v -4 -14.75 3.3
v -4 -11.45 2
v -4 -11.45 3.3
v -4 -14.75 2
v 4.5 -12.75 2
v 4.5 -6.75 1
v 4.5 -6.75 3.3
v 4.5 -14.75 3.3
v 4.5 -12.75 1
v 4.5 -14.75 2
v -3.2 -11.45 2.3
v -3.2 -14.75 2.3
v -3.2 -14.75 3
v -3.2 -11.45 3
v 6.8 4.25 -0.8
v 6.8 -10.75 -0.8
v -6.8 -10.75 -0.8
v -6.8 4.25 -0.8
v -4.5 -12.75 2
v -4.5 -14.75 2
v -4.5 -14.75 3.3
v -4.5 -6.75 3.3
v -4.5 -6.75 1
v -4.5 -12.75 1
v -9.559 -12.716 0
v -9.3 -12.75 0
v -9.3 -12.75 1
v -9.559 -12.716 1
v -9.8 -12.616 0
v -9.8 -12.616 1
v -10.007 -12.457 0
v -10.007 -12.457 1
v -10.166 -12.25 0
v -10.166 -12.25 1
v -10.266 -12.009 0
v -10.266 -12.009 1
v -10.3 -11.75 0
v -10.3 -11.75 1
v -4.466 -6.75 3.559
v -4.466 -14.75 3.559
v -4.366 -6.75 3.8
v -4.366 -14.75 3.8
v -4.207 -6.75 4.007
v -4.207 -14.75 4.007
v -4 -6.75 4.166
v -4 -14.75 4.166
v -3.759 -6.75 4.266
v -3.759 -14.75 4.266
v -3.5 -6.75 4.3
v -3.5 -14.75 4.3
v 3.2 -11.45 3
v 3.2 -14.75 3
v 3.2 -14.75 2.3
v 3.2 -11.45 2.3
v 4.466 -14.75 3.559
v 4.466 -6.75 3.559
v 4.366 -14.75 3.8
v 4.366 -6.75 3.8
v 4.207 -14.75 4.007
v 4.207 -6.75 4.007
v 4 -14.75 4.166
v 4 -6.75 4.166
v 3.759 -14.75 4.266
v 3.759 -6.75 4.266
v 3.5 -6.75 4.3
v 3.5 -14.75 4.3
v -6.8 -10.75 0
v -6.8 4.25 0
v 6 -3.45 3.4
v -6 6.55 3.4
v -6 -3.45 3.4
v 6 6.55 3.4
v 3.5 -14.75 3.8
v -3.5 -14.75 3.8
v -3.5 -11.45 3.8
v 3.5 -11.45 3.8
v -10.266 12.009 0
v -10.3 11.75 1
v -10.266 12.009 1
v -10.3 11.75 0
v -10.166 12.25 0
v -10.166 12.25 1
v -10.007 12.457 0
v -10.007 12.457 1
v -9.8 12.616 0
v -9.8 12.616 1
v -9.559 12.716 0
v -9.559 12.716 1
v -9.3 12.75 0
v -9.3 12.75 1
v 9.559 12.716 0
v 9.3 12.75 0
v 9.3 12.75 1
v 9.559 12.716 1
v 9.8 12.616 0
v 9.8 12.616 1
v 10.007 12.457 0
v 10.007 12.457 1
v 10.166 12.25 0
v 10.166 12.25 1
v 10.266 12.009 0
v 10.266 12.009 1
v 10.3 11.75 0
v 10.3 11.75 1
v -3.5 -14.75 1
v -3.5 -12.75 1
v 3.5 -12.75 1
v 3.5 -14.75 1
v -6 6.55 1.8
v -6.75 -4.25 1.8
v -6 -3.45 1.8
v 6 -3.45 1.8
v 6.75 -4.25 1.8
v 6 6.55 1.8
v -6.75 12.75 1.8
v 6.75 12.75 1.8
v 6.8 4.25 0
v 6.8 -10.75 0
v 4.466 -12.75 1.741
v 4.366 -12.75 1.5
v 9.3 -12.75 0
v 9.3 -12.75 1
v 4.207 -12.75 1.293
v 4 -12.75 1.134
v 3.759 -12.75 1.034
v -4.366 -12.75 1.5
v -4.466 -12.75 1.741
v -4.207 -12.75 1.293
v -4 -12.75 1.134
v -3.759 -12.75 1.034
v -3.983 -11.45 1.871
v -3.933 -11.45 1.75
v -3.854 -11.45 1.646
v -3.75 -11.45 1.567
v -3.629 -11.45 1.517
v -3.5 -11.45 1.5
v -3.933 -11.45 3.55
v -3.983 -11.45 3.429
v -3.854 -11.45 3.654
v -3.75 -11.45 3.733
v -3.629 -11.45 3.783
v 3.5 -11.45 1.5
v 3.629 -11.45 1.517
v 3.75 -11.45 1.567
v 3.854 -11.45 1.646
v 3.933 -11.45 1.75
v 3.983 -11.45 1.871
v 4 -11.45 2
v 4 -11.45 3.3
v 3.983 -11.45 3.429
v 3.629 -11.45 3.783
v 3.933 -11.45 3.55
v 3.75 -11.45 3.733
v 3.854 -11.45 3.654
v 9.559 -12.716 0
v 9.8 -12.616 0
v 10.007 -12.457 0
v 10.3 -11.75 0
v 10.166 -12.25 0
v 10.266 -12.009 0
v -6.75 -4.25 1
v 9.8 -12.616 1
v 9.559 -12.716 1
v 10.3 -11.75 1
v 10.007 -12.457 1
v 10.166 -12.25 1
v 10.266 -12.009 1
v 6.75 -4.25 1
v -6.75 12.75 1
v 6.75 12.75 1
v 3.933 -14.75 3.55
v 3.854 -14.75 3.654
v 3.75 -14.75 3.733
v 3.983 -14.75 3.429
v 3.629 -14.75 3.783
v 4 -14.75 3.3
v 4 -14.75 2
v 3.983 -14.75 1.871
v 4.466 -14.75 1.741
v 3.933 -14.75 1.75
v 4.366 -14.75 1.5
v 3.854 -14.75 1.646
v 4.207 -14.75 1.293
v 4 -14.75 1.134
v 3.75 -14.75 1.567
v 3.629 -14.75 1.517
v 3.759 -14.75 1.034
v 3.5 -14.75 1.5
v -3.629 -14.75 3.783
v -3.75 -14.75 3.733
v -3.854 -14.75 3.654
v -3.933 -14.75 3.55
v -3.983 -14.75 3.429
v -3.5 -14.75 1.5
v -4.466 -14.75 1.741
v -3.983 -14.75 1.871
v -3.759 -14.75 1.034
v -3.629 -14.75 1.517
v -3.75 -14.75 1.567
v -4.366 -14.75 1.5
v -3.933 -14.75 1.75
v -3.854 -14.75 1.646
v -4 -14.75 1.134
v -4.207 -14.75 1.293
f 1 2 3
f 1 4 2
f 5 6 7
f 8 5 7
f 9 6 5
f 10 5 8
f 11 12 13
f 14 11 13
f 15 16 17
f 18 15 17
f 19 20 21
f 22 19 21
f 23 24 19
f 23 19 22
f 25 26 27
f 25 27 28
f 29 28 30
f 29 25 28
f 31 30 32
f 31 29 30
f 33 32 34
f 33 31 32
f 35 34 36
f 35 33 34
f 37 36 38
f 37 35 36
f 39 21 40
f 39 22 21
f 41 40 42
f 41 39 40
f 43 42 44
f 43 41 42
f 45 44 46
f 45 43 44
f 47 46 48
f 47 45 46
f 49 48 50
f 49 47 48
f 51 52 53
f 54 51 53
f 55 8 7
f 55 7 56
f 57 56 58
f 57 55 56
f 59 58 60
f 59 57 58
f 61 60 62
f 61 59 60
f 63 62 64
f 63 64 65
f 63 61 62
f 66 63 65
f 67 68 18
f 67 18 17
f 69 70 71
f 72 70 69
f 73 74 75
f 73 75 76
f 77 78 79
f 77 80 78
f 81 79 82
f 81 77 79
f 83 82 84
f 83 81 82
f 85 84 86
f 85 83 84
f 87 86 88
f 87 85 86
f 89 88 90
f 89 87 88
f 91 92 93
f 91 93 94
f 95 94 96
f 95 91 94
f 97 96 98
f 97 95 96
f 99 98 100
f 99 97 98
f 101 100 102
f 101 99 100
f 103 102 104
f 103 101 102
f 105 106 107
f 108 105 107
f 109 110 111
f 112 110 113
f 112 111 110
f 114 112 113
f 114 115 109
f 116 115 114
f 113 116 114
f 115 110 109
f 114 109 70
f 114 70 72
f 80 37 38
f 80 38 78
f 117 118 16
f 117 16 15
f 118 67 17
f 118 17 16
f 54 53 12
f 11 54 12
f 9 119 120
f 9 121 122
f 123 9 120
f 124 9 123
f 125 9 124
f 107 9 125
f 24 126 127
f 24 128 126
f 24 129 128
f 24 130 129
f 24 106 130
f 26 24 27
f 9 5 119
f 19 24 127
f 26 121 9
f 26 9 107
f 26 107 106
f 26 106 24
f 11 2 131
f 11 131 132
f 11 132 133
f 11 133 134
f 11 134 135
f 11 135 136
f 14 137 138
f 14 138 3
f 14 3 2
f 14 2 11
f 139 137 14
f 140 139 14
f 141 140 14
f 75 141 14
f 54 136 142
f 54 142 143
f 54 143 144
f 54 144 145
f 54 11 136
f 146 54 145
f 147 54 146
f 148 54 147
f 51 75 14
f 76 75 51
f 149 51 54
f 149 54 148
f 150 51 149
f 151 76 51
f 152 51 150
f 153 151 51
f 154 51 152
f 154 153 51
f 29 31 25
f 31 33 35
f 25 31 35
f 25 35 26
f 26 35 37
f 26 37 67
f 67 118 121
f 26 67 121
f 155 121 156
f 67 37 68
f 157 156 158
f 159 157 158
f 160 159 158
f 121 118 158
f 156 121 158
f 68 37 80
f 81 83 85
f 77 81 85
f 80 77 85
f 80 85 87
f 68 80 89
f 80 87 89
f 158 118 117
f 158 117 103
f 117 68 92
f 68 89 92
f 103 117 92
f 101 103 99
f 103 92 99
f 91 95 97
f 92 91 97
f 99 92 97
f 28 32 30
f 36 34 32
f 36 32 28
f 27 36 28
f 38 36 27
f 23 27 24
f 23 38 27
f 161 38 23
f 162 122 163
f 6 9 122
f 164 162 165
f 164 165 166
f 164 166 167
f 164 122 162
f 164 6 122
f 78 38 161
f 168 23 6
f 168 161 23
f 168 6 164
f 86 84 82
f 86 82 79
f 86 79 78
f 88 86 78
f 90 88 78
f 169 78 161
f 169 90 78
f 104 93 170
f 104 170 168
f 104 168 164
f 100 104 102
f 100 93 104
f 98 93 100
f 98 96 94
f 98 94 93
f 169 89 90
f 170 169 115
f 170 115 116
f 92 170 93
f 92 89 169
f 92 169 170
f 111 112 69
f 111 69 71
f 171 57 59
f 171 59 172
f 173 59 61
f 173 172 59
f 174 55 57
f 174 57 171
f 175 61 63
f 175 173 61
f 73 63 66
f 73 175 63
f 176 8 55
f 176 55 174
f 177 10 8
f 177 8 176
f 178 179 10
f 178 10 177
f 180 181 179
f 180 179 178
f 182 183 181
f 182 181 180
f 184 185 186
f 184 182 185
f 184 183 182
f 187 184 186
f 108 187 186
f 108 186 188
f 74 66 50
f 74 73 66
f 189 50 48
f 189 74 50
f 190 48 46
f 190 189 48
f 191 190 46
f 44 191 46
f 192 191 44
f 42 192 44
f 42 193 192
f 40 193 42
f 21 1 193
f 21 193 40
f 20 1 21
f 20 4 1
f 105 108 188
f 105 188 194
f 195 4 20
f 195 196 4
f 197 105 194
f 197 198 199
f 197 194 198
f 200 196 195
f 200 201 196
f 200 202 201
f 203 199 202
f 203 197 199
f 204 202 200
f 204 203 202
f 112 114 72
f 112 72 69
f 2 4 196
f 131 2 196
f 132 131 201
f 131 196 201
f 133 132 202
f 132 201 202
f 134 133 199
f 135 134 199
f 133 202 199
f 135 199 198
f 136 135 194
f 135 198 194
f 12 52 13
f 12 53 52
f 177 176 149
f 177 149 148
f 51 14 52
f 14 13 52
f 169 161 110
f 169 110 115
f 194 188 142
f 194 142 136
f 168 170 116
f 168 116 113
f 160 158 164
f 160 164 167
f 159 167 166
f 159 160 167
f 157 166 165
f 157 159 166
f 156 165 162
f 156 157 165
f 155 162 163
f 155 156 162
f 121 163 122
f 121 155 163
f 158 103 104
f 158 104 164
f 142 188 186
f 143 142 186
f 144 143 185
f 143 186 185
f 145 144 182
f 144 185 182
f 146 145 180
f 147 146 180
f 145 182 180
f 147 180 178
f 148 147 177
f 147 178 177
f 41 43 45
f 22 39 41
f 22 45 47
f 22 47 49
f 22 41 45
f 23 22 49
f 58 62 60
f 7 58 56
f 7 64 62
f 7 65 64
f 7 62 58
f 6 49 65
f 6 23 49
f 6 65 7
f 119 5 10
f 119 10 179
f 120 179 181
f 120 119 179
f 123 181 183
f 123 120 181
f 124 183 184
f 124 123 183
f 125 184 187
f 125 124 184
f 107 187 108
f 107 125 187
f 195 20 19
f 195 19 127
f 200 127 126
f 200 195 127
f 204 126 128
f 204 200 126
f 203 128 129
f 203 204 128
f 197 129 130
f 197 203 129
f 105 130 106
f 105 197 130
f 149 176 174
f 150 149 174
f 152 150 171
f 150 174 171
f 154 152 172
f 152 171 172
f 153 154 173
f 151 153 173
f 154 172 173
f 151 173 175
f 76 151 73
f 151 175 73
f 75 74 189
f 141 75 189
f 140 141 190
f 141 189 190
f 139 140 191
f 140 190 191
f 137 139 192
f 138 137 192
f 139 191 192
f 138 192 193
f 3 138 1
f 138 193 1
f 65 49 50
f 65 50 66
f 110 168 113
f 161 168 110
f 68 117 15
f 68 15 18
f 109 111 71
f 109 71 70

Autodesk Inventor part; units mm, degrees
ref_plane "YZ Plane" through (0, 0, 0) normal (1, 0, 0) x (0, 1, 0)
ref_plane "XZ Plane" through (0, 0, 0) normal (0, 1, 0) x (-1, 0, 0)
ref_plane "XY Plane" through (0, 0, 0) normal (0, 0, 1) x (1, 0, 0)
sketch "Skizze1" plane through (0, 0, 0) normal (0, 0, 1) x (1, 0, 0)
  line L0 (-9.3, 12.75) -> (9.3, 12.75)
  line L1 (10.3, 11.75) -> (10.3, -11.75)
  line L2 (9.3, -12.75) -> (-9.3, -12.75)
  line L3 (-10.3, -11.75) -> (-10.3, 11.75)
  line L4 (-10.3, 12.75) -> (10.3, -12.75) construction
  line L5 (10.3, 12.75) -> (-10.3, -12.75) construction
  arc A0 (-9.3, 12.75) -> (-10.3, 11.75) centre (-9.3, 11.75) ccw
  arc A1 (10.3, 11.75) -> (9.3, 12.75) centre (9.3, 11.75) ccw
  arc A2 (9.3, -12.75) -> (10.3, -11.75) centre (9.3, -11.75) ccw
  arc A3 (-10.3, -11.75) -> (-9.3, -12.75) centre (-9.3, -11.75) ccw
  point P0 (0, 0)
  dimension "d0" = 20.6
  dimension "d1" = 25.5
  dimension "d2" = 1
extrude "Extrusion1" add sketch "Skizze1" along normal blind 1
sketch "Skizze2" plane through (0, 0, 1) normal (0, 0, 1) x (1, 0, 0)
  line L0 (9.3, 12.75) -> (-9.3, 12.75) projected
  line L1 (-6.75, 12.75) -> (6.75, 12.75)
  line L2 (6.75, 12.75) -> (6.75, -4.25)
  line L3 (6.75, -4.25) -> (-6.75, -4.25)
  line L4 (-6.75, -4.25) -> (-6.75, 12.75)
  line L5 (-10.3, 11.75) -> (-10.3, -11.75) projected
  line L6 (10.3, -11.75) -> (10.3, 11.75) projected
  point P0 (0, 0)
  point P1 (6.75, 12.75)
  dimension "d5" = 13.5
  dimension "d6" = 3.55
  dimension "d7" = 3.55
  dimension "d8" = 17
extrude "Extrusion2" add sketch "Skizze2" along normal blind 0.8
sketch "Skizze3" plane through (0, 0, 1.8) normal (0, 0, 1) x (1, 0, 0)
  line L0 (6, -3.45) -> (-6, -3.45)
  line L1 (-6, -3.45) -> (-6, 6.55)
  line L2 (-6, 6.55) -> (6, 6.55)
  line L3 (6, 6.55) -> (6, -3.45)
  line L4 (-6.75, -4.25) -> (6.75, -4.25) projected
  point P0 (0, 0)
  dimension "d11" = 10
  dimension "d12" = 12
  dimension "d13" = 6
  dimension "d14" = 0.8
extrude "Extrusion3" add sketch "Skizze3" along normal blind 1.6
sketch "Skizze4" plane through (0, 0, 1) normal (0, 0, 1) x (1, 0, 0)
  line L0 (4.5, -14.75) -> (-4.5, -14.75)
  line L1 (-4.5, -14.75) -> (-4.5, -6.75)
  line L2 (-4.5, -6.75) -> (4.5, -6.75)
  line L3 (4.5, -6.75) -> (4.5, -14.75)
  line L4 (-9.3, -12.75) -> (9.3, -12.75) projected
  point P0 (0, 0)
  dimension "d17" = 9
  dimension "d18" = 4.5
  dimension "d19" = 2
  dimension "d20" = 8
extrude "Extrusion4" add sketch "Skizze4" along normal blind 3.3
fillet "Rundung1" radius 1 4 edges at (-4.5, -10.75, 4.3) (4.5, -10.75, 4.3) (-4.5, -13.75, 1) (4.5, -13.75, 1)
sketch "Skizze5" plane through (-3.5, -14.75, 1) normal (0, -1, 0) x (1, 0, 0)
  arc A0 (7, 0) -> (8, 1) centre (7, 1) ccw projected
  line L0 (8, 1) -> (8, 2.3) projected
  arc A1 (8, 2.3) -> (7, 3.3) centre (7, 2.3) ccw projected
  line L1 (0, 3.3) -> (7, 3.3) projected
  arc A2 (0, 3.3) -> (-1, 2.3) centre (0, 2.3) ccw projected
  line L2 (-1, 1) -> (-1, 2.3) projected
  arc A3 (-1, 1) -> (0, 0) centre (0, 1) ccw projected
  line L3 (0, 0) -> (7, 0) projected
  arc A4 (7.5, 2.3) -> (7, 2.8) centre (7, 2.3) ccw
  line L4 (7.5, 2.3) -> (7.5, 1)
  arc A5 (7, 0.5) -> (7.5, 1) centre (7, 1) ccw
  line L5 (7, 0.5) -> (0, 0.5)
  arc A6 (-0.5, 1) -> (0, 0.5) centre (0, 1) ccw
  line L6 (-0.5, 1) -> (-0.5, 2.3)
  arc A7 (0, 2.8) -> (-0.5, 2.3) centre (0, 2.3) ccw
  line L7 (0, 2.8) -> (7, 2.8)
  line L8 (6.7, 2) -> (6.7, 1.3)
  line L9 (6.7, 1.3) -> (0.3, 1.3)
  line L10 (0.3, 1.3) -> (0.3, 2)
  line L11 (0.3, 2) -> (6.7, 2)
  point P0 (3.5, -1)
  dimension "d24" = 0.5
  dimension "d25" = 0.8
extrude "Extrusion5" cut sketch "Skizze5" against normal blind 3.3 contours L4 A5 L5 A6 L6 A7 L7 A4
sketch "Skizze6" plane through (0, 0, 0) normal (0, 0, -1) x (-1, 0, 0)
  line L0 (-6.8, 4.25) -> (6.8, 4.25)
  line L1 (6.8, 4.25) -> (6.8, -10.75)
  line L2 (6.8, -10.75) -> (-6.8, -10.75)
  line L3 (-6.8, -10.75) -> (-6.8, 4.25)
  line L4 (10.3, 11.75) -> (10.3, -11.75) projected
  line L5 (-10.3, -11.75) -> (-10.3, 11.75) projected
  line L6 (-9.3, 12.75) -> (9.3, 12.75) projected
  line L7 (9.3, -12.75) -> (-9.3, -12.75) projected
  point P0 (0, 0)
  dimension "d28" = 3.5
  dimension "d29" = 3.5
  dimension "d30" = 8.5
  dimension "d31" = 2
extrude "Extrusion6" add sketch "Skizze6" along normal blind 0.8
equation "\"d6\" = d7"
equation "\"d13\" = 0.5 * d12"
equation "\"d18\" = 0.5 * d17"
equation "\"d29\" = d28"
properties part number "C3"
